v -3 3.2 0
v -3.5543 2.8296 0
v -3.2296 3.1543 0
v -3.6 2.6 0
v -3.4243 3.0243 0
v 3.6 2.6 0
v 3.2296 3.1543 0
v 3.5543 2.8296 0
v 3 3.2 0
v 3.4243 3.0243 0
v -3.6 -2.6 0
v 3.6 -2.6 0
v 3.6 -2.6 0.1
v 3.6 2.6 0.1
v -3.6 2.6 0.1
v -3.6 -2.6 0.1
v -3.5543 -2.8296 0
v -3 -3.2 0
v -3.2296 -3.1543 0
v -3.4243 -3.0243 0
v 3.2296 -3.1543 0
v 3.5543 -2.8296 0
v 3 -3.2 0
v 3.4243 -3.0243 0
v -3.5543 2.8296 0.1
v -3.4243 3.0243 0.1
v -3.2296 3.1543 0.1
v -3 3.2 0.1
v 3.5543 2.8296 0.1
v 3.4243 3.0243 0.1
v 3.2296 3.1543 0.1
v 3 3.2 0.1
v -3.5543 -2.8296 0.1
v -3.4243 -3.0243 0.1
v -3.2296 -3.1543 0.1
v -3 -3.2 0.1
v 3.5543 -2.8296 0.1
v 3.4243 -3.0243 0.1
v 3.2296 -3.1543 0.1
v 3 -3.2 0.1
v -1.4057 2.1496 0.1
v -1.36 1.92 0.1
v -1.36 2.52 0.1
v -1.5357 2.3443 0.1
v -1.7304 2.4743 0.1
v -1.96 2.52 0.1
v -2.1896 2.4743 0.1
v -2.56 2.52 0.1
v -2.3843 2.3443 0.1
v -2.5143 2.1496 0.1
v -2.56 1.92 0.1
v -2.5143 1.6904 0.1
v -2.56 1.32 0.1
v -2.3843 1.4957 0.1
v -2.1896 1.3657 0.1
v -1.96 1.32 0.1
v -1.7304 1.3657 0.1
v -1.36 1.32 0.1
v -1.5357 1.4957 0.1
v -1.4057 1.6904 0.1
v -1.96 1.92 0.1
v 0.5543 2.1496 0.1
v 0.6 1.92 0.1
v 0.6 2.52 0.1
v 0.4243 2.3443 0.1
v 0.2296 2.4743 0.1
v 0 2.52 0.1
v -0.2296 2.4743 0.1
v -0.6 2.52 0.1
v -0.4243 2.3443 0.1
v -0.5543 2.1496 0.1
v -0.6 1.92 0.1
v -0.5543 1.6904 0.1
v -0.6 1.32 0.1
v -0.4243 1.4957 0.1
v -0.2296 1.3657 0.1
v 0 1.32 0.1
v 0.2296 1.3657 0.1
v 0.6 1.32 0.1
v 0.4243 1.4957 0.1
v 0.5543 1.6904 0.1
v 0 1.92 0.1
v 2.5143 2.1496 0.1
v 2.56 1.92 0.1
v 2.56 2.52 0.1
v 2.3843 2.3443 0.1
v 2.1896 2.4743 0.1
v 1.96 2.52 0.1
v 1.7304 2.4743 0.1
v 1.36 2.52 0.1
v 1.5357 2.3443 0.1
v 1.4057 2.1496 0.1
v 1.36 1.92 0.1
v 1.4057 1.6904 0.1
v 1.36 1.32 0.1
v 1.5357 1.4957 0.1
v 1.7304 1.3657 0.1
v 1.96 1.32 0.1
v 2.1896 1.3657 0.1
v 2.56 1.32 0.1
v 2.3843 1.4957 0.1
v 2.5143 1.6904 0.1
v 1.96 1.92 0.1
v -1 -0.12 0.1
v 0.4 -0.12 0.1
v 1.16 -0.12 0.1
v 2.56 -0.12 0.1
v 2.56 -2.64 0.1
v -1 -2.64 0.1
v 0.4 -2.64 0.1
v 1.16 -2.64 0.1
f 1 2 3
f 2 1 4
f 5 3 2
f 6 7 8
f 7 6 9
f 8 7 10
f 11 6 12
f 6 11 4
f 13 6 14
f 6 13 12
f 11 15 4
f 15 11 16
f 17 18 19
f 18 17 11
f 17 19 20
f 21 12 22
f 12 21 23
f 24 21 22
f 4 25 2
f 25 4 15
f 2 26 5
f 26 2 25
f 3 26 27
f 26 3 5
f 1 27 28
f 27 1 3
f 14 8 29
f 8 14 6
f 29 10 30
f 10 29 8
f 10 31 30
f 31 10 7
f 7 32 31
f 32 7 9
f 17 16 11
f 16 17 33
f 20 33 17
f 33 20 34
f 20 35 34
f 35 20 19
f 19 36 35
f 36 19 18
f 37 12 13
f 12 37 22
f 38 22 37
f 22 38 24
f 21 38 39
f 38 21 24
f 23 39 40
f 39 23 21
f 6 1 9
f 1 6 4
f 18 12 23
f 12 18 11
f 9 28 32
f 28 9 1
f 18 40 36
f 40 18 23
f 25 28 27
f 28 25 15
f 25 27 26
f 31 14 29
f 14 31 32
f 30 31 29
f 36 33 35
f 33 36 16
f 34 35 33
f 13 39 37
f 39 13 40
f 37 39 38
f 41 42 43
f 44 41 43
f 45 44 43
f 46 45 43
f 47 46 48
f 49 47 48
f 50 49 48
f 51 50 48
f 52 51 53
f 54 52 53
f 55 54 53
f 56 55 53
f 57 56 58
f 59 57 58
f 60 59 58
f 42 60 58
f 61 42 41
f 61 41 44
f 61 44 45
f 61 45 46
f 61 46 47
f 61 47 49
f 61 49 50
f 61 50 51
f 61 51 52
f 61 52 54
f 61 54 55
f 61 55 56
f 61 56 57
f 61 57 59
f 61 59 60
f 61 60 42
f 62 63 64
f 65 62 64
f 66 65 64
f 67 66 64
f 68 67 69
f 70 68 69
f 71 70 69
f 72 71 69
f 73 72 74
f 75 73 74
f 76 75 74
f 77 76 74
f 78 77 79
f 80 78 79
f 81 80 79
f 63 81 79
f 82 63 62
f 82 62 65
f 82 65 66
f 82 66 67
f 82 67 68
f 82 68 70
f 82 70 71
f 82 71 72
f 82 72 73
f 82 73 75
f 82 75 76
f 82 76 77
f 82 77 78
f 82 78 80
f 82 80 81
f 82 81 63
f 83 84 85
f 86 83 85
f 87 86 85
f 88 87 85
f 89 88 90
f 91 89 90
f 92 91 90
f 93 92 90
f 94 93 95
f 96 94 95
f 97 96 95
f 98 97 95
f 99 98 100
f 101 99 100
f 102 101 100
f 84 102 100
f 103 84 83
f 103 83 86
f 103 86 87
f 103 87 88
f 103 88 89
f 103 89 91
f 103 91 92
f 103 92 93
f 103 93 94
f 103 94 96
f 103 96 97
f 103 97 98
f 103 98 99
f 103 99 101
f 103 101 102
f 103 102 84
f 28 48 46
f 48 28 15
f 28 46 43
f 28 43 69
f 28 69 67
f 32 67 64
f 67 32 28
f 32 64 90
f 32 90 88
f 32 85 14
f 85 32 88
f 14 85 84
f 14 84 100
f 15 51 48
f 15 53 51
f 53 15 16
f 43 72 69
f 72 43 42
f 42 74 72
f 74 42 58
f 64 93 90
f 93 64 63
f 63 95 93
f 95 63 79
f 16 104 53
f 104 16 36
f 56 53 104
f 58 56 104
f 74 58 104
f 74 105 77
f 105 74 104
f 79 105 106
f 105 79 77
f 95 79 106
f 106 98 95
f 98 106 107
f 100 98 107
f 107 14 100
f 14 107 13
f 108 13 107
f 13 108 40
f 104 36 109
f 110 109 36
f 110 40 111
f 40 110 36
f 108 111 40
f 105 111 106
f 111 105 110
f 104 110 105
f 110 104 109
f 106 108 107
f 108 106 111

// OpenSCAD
// file: ../p/box3u12.scad
use <../lib.scad>
function ldraw_lib__box3u12() = [
// 0 Box with 3 Parallel Faces without Any Edges
// 0 Name: box3u12.dat
// 0 Author: J.C. Tchang [tchang]
// 0 !LDRAW_ORG Primitive UPDATE 2014-02
// 0 !LICENSE Licensed under CC BY 4.0 : see CAreadme.txt
// 
// 0 BFC CERTIFY CCW
  [0,"BFC","CERTIFY"],
  [0,"BFC","CCW"],
// 
// 0 !HISTORY 2014-12-23 [PTadmin] Official Update 2014-02
// 
// 
// 4 16 -1 1 1 1 1 1 1 1 -1 -1 1 -1
  [4,16,-1,1,1,1,1,1,1,1,-1,-1,1,-1],
// 4 16 -1 1 1 -1 0 1 1 0 1 1 1 1
  [4,16,-1,1,1,-1,0,1,1,0,1,1,1,1],
// 4 16 1 1 -1 1 0 -1 -1 0 -1 -1 1 -1
  [4,16,1,1,-1,1,0,-1,-1,0,-1,-1,1,-1],
];
module ldraw_lib__box3u12(step=0, col=false, unit=2/5, alt=false, line=0.2, solid=!$preview)
    makepoly(ldraw_lib__box3u12(), step=step, col=col, unit=unit, alt=alt, line=line, solid=solid);
ldraw_lib__box3u12(line=0.2);
// file: ../p/1-4cyli.scad
use <../lib.scad>
function ldraw_lib__1_4cyli() = [
// 0 Cylinder 0.25
// 0 Name: 1-4cyli.dat
// 0 Author: James Jessiman
// 0 !LDRAW_ORG Primitive UPDATE 2012-01
// 0 !LICENSE Licensed under CC BY 4.0 : see CAreadme.txt
// 
// 0 BFC CERTIFY CCW
  [0,"BFC","CERTIFY"],
  [0,"BFC","CCW"],
// 
// 0 !HISTORY 2002-03-23 [sbliss] Added BFC statement.
// 0 !HISTORY 2002-04-25 [PTadmin] Official Update 2002-02
// 0 !HISTORY 2007-06-22 [PTadmin] Header formatted for Contributor Agreement
// 0 !HISTORY 2008-07-01 [PTadmin] Official Update 2008-01
// 0 !HISTORY 2012-02-16 [Philo] Changed to CCW
// 0 !HISTORY 2012-03-30 [PTadmin] Official Update 2012-01
// 
// 
// 4 16 1 1 0 0.9239 1 0.3827 0.9239 0 0.3827 1 0 0
  [4,16,1,1,0,0.9239,1,0.3827,0.9239,0,0.3827,1,0,0],
// 5 24 1 0 0 1 1 0 0.9239 0 0.3827 1 0 -1
  [5,24,1,0,0,1,1,0,0.9239,0,0.3827,1,0,-1],
// 4 16 0.9239 1 0.3827 0.7071 1 0.7071 0.7071 0 0.7071 0.9239 0 0.3827
  [4,16,0.9239,1,0.3827,0.7071,1,0.7071,0.7071,0,0.7071,0.9239,0,0.3827],
// 5 24 0.9239 0 0.3827 0.9239 1 0.3827 0.7071 0 0.7071 1 0 0
  [5,24,0.9239,0,0.3827,0.9239,1,0.3827,0.7071,0,0.7071,1,0,0],
// 4 16 0.7071 1 0.7071 0.3827 1 0.9239 0.3827 0 0.9239 0.7071 0 0.7071
  [4,16,0.7071,1,0.7071,0.3827,1,0.9239,0.3827,0,0.9239,0.7071,0,0.7071],
// 5 24 0.7071 0 0.7071 0.7071 1 0.7071 0.3827 0 0.9239 0.9239 0 0.3827
  [5,24,0.7071,0,0.7071,0.7071,1,0.7071,0.3827,0,0.9239,0.9239,0,0.3827],
// 4 16 0.3827 1 0.9239 0 1 1 0 0 1 0.3827 0 0.9239
  [4,16,0.3827,1,0.9239,0,1,1,0,0,1,0.3827,0,0.9239],
// 5 24 0.3827 0 0.9239 0.3827 1 0.9239 0 0 1 0.7071 0 0.7071
  [5,24,0.3827,0,0.9239,0.3827,1,0.9239,0,0,1,0.7071,0,0.7071],
// 5 24 0 0 1 0 1 1 0.3827 0 0.9239 -1 0 1
  [5,24,0,0,1,0,1,1,0.3827,0,0.9239,-1,0,1],
];
module ldraw_lib__1_4cyli(step=0, col=false, unit=2/5, alt=false, line=0.2, solid=!$preview)
    makepoly(ldraw_lib__1_4cyli(), step=step, col=col, unit=unit, alt=alt, line=line, solid=solid);
ldraw_lib__1_4cyli(line=0.2);
// file: s/stickerback008x009.scad
use <../../lib.scad>
use <../../p/1-4chrd.scad>
use <../../p/1-4cyli.scad>
use <../../p/box3u12.scad>
function ldraw_lib__s__stickerback008x009() = [
// 0 ~Sticker Back  0.8 x  0.9
// 0 Name: s\stickerback008x009.dat
// 0 Author: Massimo Maso [Sirio]
// 0 !LDRAW_ORG Subpart UPDATE 2026-05
// 0 !LICENSE Licensed under CC BY 4.0 : see CAreadme.txt
// 
// 0 BFC CERTIFY CCW
  [0,"BFC","CERTIFY"],
  [0,"BFC","CCW"],
// 
// 0 !HISTORY 2025-08-31 [OrionP] Official Update 2025-08
// 0 !HISTORY 2026-04-18 [MagFors] corrected length
// 0 !HISTORY 2026-05-31 [OrionP] Official Update 2026-05
// 
// 0 // Primitives
// 1 16 -7.5 0 6.5 -1.5 0 0 0 -1 0 0 0 1.5 1-4chrd.dat
  [1,16,-7.5,0,6.5,-1.5,0,0,0,-1,0,0,0,1.5, ldraw_lib__1_4chrd()],
// 1 16 7.5 0 6.5 1.5 0 0 0 -1 0 0 0 1.5 1-4chrd.dat
  [1,16,7.5,0,6.5,1.5,0,0,0,-1,0,0,0,1.5, ldraw_lib__1_4chrd()],
// 1 16 0 -.25 0 0 0 9 0 .25 0 6.5 0 0 box3u12.dat
  [1,16,0,-.25,0,0,0,9,0,.25,0,6.5,0,0, ldraw_lib__box3u12()],
// 1 16 -7.5 0 -6.5 -1.5 0 0 0 -1 0 0 0 -1.5 1-4chrd.dat
  [1,16,-7.5,0,-6.5,-1.5,0,0,0,-1,0,0,0,-1.5, ldraw_lib__1_4chrd()],
// 1 16 7.5 0 -6.5 1.5 0 0 0 -1 0 0 0 -1.5 1-4chrd.dat
  [1,16,7.5,0,-6.5,1.5,0,0,0,-1,0,0,0,-1.5, ldraw_lib__1_4chrd()],
// 1 16 -7.5 0 6.5 -1.5 0 0 0 -.25 0 0 0 1.5 1-4cyli.dat
  [1,16,-7.5,0,6.5,-1.5,0,0,0,-.25,0,0,0,1.5, ldraw_lib__1_4cyli()],
// 1 16 7.5 0 6.5 1.5 0 0 0 -.25 0 0 0 1.5 1-4cyli.dat
  [1,16,7.5,0,6.5,1.5,0,0,0,-.25,0,0,0,1.5, ldraw_lib__1_4cyli()],
// 1 16 -7.5 0 -6.5 -1.5 0 0 0 -.25 0 0 0 -1.5 1-4cyli.dat
  [1,16,-7.5,0,-6.5,-1.5,0,0,0,-.25,0,0,0,-1.5, ldraw_lib__1_4cyli()],
// 1 16 7.5 0 -6.5 1.5 0 0 0 -.25 0 0 0 -1.5 1-4cyli.dat
  [1,16,7.5,0,-6.5,1.5,0,0,0,-.25,0,0,0,-1.5, ldraw_lib__1_4cyli()],
// 0 // Bottom face
// 4 16 -7.5 0 8 7.5 0 8 9 0 6.5 -9 0 6.5
  [4,16,-7.5,0,8,7.5,0,8,9,0,6.5,-9,0,6.5],
// 4 16 -7.5 0 -8 -9 0 -6.5 9 0 -6.5 7.5 0 -8
  [4,16,-7.5,0,-8,-9,0,-6.5,9,0,-6.5,7.5,0,-8],
// 0 // Lateral face
// 4 16 -7.5 0 8 -7.5 -.25 8 7.5 -.25 8 7.5 0 8
  [4,16,-7.5,0,8,-7.5,-.25,8,7.5,-.25,8,7.5,0,8],
// 4 16 -7.5 0 -8 7.5 0 -8 7.5 -.25 -8 -7.5 -.25 -8
  [4,16,-7.5,0,-8,7.5,0,-8,7.5,-.25,-8,-7.5,-.25,-8],
];
module ldraw_lib__s__stickerback008x009(step=0, col=false, unit=2/5, alt=false, line=0.2, solid=!$preview)
    makepoly(ldraw_lib__s__stickerback008x009(), step=step, col=col, unit=unit, alt=alt, line=line, solid=solid);
ldraw_lib__s__stickerback008x009(line=0.2);
// file: ../p/4-4ndis.scad
use <../lib.scad>
function ldraw_lib__4_4ndis() = [
// 0 Disc Negative 1.0
// 0 Name: 4-4ndis.dat
// 0 Author: James Jessiman
// 0 !LDRAW_ORG Primitive UPDATE 2012-01
// 0 !LICENSE Licensed under CC BY 4.0 : see CAreadme.txt
// 
// 0 BFC CERTIFY CCW
  [0,"BFC","CERTIFY"],
  [0,"BFC","CCW"],
// 
// 0 !HISTORY 2002-03-23 [sbliss] Added BFC statement; compacted code
// 0 !HISTORY 2002-04-25 [PTadmin] Official Update 2002-02
// 0 !HISTORY 2007-06-24 [PTadmin] Header formatted for Contributor Agreement
// 0 !HISTORY 2008-07-01 [PTadmin] Official Update 2008-01
// 0 !HISTORY 2012-02-16 [Philo] Changed to CCW
// 0 !HISTORY 2012-03-30 [PTadmin] Official Update 2012-01
// 
// 
// 3 16 0.9239 0 0.3827 1 0 0 1 0 1
  [3,16,0.9239,0,0.3827,1,0,0,1,0,1],
// 3 16 0.7071 0 0.7071 0.9239 0 0.3827 1 0 1
  [3,16,0.7071,0,0.7071,0.9239,0,0.3827,1,0,1],
// 3 16 0.3827 0 0.9239 0.7071 0 0.7071 1 0 1
  [3,16,0.3827,0,0.9239,0.7071,0,0.7071,1,0,1],
// 3 16 0 0 1 0.3827 0 0.9239 1 0 1
  [3,16,0,0,1,0.3827,0,0.9239,1,0,1],
// 3 16 -0.3827 0 0.9239 0 0 1 -1 0 1
  [3,16,-0.3827,0,0.9239,0,0,1,-1,0,1],
// 3 16 -0.7071 0 0.7071 -0.3827 0 0.9239 -1 0 1
  [3,16,-0.7071,0,0.7071,-0.3827,0,0.9239,-1,0,1],
// 3 16 -0.9239 0 0.3827 -0.7071 0 0.7071 -1 0 1
  [3,16,-0.9239,0,0.3827,-0.7071,0,0.7071,-1,0,1],
// 3 16 -1 0 0 -0.9239 0 0.3827 -1 0 1
  [3,16,-1,0,0,-0.9239,0,0.3827,-1,0,1],
// 3 16 -0.9239 0 -0.3827 -1 0 0 -1 0 -1
  [3,16,-0.9239,0,-0.3827,-1,0,0,-1,0,-1],
// 3 16 -0.7071 0 -0.7071 -0.9239 0 -0.3827 -1 0 -1
  [3,16,-0.7071,0,-0.7071,-0.9239,0,-0.3827,-1,0,-1],
// 3 16 -0.3827 0 -0.9239 -0.7071 0 -0.7071 -1 0 -1
  [3,16,-0.3827,0,-0.9239,-0.7071,0,-0.7071,-1,0,-1],
// 3 16 0 0 -1 -0.3827 0 -0.9239 -1 0 -1
  [3,16,0,0,-1,-0.3827,0,-0.9239,-1,0,-1],
// 3 16 0.3827 0 -0.9239 0 0 -1 1 0 -1
  [3,16,0.3827,0,-0.9239,0,0,-1,1,0,-1],
// 3 16 0.7071 0 -0.7071 0.3827 0 -0.9239 1 0 -1
  [3,16,0.7071,0,-0.7071,0.3827,0,-0.9239,1,0,-1],
// 3 16 0.9239 0 -0.3827 0.7071 0 -0.7071 1 0 -1
  [3,16,0.9239,0,-0.3827,0.7071,0,-0.7071,1,0,-1],
// 3 16 1 0 0 0.9239 0 -0.3827 1 0 -1
  [3,16,1,0,0,0.9239,0,-0.3827,1,0,-1],
];
module ldraw_lib__4_4ndis(step=0, col=false, unit=2/5, alt=false, line=0.2, solid=!$preview)
    makepoly(ldraw_lib__4_4ndis(), step=step, col=col, unit=unit, alt=alt, line=line, solid=solid);
ldraw_lib__4_4ndis(line=0.2);
// file: ../p/4-4disc.scad
use <../lib.scad>
function ldraw_lib__4_4disc() = [
// 0 Disc 1.0
// 0 Name: 4-4disc.dat
// 0 Author: James Jessiman
// 0 !LDRAW_ORG Primitive UPDATE 2002-02
// 0 !LICENSE Licensed under CC BY 4.0 : see CAreadme.txt
// 
// 0 BFC CERTIFY CCW
  [0,"BFC","CERTIFY"],
  [0,"BFC","CCW"],
// 
// 0 !HISTORY 1998-12-15 [PTadmin] Official Update 1998-10
// 0 !HISTORY 2002-03-23 [sbliss] Added BFC statement
// 0 !HISTORY 2002-04-25 [PTadmin] Official Update 2002-02
// 0 !HISTORY 2007-06-24 [PTadmin] Header formatted for Contributor Agreement
// 0 !HISTORY 2008-07-01 [PTadmin] Official Update 2008-01
// 
// 
// 3 16 0 0 0 1 0 0 0.9239 0 0.3827
  [3,16,0,0,0,1,0,0,0.9239,0,0.3827],
// 3 16 0 0 0 0.9239 0 0.3827 0.7071 0 0.7071
  [3,16,0,0,0,0.9239,0,0.3827,0.7071,0,0.7071],
// 3 16 0 0 0 0.7071 0 0.7071 0.3827 0 0.9239
  [3,16,0,0,0,0.7071,0,0.7071,0.3827,0,0.9239],
// 3 16 0 0 0 0.3827 0 0.9239 0 0 1
  [3,16,0,0,0,0.3827,0,0.9239,0,0,1],
// 3 16 0 0 0 0 0 1 -0.3827 0 0.9239
  [3,16,0,0,0,0,0,1,-0.3827,0,0.9239],
// 3 16 0 0 0 -0.3827 0 0.9239 -0.7071 0 0.7071
  [3,16,0,0,0,-0.3827,0,0.9239,-0.7071,0,0.7071],
// 3 16 0 0 0 -0.7071 0 0.7071 -0.9239 0 0.3827
  [3,16,0,0,0,-0.7071,0,0.7071,-0.9239,0,0.3827],
// 3 16 0 0 0 -0.9239 0 0.3827 -1 0 -0
  [3,16,0,0,0,-0.9239,0,0.3827,-1,0,-0],
// 3 16 0 0 0 -1 0 -0 -0.9239 0 -0.3827
  [3,16,0,0,0,-1,0,-0,-0.9239,0,-0.3827],
// 3 16 0 0 0 -0.9239 0 -0.3827 -0.7071 0 -0.7071
  [3,16,0,0,0,-0.9239,0,-0.3827,-0.7071,0,-0.7071],
// 3 16 0 0 0 -0.7071 0 -0.7071 -0.3827 0 -0.9239
  [3,16,0,0,0,-0.7071,0,-0.7071,-0.3827,0,-0.9239],
// 3 16 0 0 0 -0.3827 0 -0.9239 0 0 -1
  [3,16,0,0,0,-0.3827,0,-0.9239,0,0,-1],
// 3 16 0 0 0 0 0 -1 0.3827 0 -0.9239
  [3,16,0,0,0,0,0,-1,0.3827,0,-0.9239],
// 3 16 0 0 0 0.3827 0 -0.9239 0.7071 0 -0.7071
  [3,16,0,0,0,0.3827,0,-0.9239,0.7071,0,-0.7071],
// 3 16 0 0 0 0.7071 0 -0.7071 0.9239 0 -0.3827
  [3,16,0,0,0,0.7071,0,-0.7071,0.9239,0,-0.3827],
// 3 16 0 0 0 0.9239 0 -0.3827 1 0 0
  [3,16,0,0,0,0.9239,0,-0.3827,1,0,0],
// 0
];
module ldraw_lib__4_4disc(step=0, col=false, unit=2/5, alt=false, line=0.2, solid=!$preview)
    makepoly(ldraw_lib__4_4disc(), step=step, col=col, unit=unit, alt=alt, line=line, solid=solid);
ldraw_lib__4_4disc(line=0.2);
// file: ../p/1-4chrd.scad
use <../lib.scad>
function ldraw_lib__1_4chrd() = [
// 0 Chord 0.25
// 0 Name: 1-4chrd.dat
// 0 Author: Max Martin Richter [MMR1988]
// 0 !LDRAW_ORG Primitive UPDATE 2023-05
// 0 !LICENSE Licensed under CC BY 4.0 : see CAreadme.txt
// 
// 0 BFC CERTIFY CCW
  [0,"BFC","CERTIFY"],
  [0,"BFC","CCW"],
// 
// 0 !HISTORY 2004-04-22 [PTadmin] Official Update 2004-02
// 0 !HISTORY 2007-10-09 [PTadmin] Header formatted for Contributor Agreement
// 0 !HISTORY 2008-07-01 [PTadmin] Official Update 2008-01
// 0 !HISTORY 2012-08-02 [MMR1988] Re-creation with PrimGen2 and Rectifier
// 0 !HISTORY 2012-08-09 [PTadmin] Official Update 2012-02
// 0 !HISTORY 2023-10-27 [OrionP] Change author to MMR1988 from hafhead
// 0 !HISTORY 2023-10-31 [OrionP] Official Update 2023-05
// 
// 4 16 0.9239 0 0.3827 0.3827 0 0.9239 0 0 1 1 0 0
  [4,16,0.9239,0,0.3827,0.3827,0,0.9239,0,0,1,1,0,0],
// 3 16 0.7071 0 0.7071 0.3827 0 0.9239 0.9239 0 0.3827
  [3,16,0.7071,0,0.7071,0.3827,0,0.9239,0.9239,0,0.3827],
];
module ldraw_lib__1_4chrd(step=0, col=false, unit=2/5, alt=false, line=0.2, solid=!$preview)
    makepoly(ldraw_lib__1_4chrd(), step=step, col=col, unit=unit, alt=alt, line=line, solid=solid);
ldraw_lib__1_4chrd(line=0.2);
// main file
use <../lib.scad>
use <../p/1-4chrd.scad>
use <../p/4-4disc.scad>
use <../p/4-4ndis.scad>
use <s/stickerback008x009.scad>
function ldraw_lib__4510086b() = [
// 0 Sticker  0.8 x  0.9 with Red and Blue Buttons
// 0 Name: 4510086b.dat
// 0 Author: Evert-Jan Boer [ejboer]
// 0 !LDRAW_ORG Part UPDATE 2026-08
// 0 !LICENSE Licensed under CC BY 4.0 : see CAreadme.txt
// 
// 0 BFC CERTIFY CCW
  [0,"BFC","CERTIFY"],
  [0,"BFC","CCW"],
// 
// 0 !CATEGORY Sticker
// 0 !KEYWORDS Bricklink 10179stk01, Brickowl 677332, Millennium Falcon
// 0 !KEYWORDS Rebrickable 60285, Set 10179, Star Wars
// 
// 0 !HISTORY 2024-06-30 [OrionP] Official Update 2024-05
// 0 !HISTORY 2026-04-17 [Sirio] Introduced stickerback, changed description, and adapted top face
// 0 !HISTORY 2026-08-27 [MagFors] Update description
// 0 !HISTORY 2026-08-31 [OrionP] Official Update 2026-08
// 
// 0 // Stickerback
// 1 16 0 0 0 1 0 0 0 1 0 0 0 1 s\stickerback008x009.dat
  [1,16,0,0,0,1,0,0,0,1,0,0,0,1, ldraw_lib__s__stickerback008x009()],
// 0 // Primitives
// 1 0 -7.5 -.25 6.5 -1.5 0 0 0 1 0 0 0 1.5 1-4chrd.dat
  [1,0,-7.5,-.25,6.5,-1.5,0,0,0,1,0,0,0,1.5, ldraw_lib__1_4chrd()],
// 1 0 7.5 -.25 6.5 1.5 0 0 0 1 0 0 0 1.5 1-4chrd.dat
  [1,0,7.5,-.25,6.5,1.5,0,0,0,1,0,0,0,1.5, ldraw_lib__1_4chrd()],
// 1 0 -7.5 -.25 -6.5 -1.5 0 0 0 1 0 0 0 -1.5 1-4chrd.dat
  [1,0,-7.5,-.25,-6.5,-1.5,0,0,0,1,0,0,0,-1.5, ldraw_lib__1_4chrd()],
// 1 0 7.5 -.25 -6.5 1.5 0 0 0 1 0 0 0 -1.5 1-4chrd.dat
  [1,0,7.5,-.25,-6.5,1.5,0,0,0,1,0,0,0,-1.5, ldraw_lib__1_4chrd()],
// 1 0 -4.9 -.25 4.8 1.5 0 0 0 1 0 0 0 1.5 4-4ndis.dat
  [1,0,-4.9,-.25,4.8,1.5,0,0,0,1,0,0,0,1.5, ldraw_lib__4_4ndis()],
// 1 4 -4.9 -.25 4.8 1.5 0 0 0 1 0 0 0 1.5 4-4disc.dat
  [1,4,-4.9,-.25,4.8,1.5,0,0,0,1,0,0,0,1.5, ldraw_lib__4_4disc()],
// 1 0 0 -.25 4.8 1.5 0 0 0 1 0 0 0 1.5 4-4ndis.dat
  [1,0,0,-.25,4.8,1.5,0,0,0,1,0,0,0,1.5, ldraw_lib__4_4ndis()],
// 1 4 0 -.25 4.8 1.5 0 0 0 1 0 0 0 1.5 4-4disc.dat
  [1,4,0,-.25,4.8,1.5,0,0,0,1,0,0,0,1.5, ldraw_lib__4_4disc()],
// 1 0 4.9 -.25 4.8 1.5 0 0 0 1 0 0 0 1.5 4-4ndis.dat
  [1,0,4.9,-.25,4.8,1.5,0,0,0,1,0,0,0,1.5, ldraw_lib__4_4ndis()],
// 1 4 4.9 -.25 4.8 1.5 0 0 0 1 0 0 0 1.5 4-4disc.dat
  [1,4,4.9,-.25,4.8,1.5,0,0,0,1,0,0,0,1.5, ldraw_lib__4_4disc()],
// 0 // Top face
// 0 // Black faces
// 4 0 -9 -.25 6.5 -6.4 -.25 6.3 -4.9 -.25 6.3 -7.5 -.25 8
  [4,0,-9,-.25,6.5,-6.4,-.25,6.3,-4.9,-.25,6.3,-7.5,-.25,8],
// 3 0 -7.5 -.25 8 -4.9 -.25 6.3 -3.4 -.25 6.3
  [3,0,-7.5,-.25,8,-4.9,-.25,6.3,-3.4,-.25,6.3],
// 3 0 -7.5 -.25 8 -3.4 -.25 6.3 -1.5 -.25 6.3
  [3,0,-7.5,-.25,8,-3.4,-.25,6.3,-1.5,-.25,6.3],
// 3 0 -7.5 -.25 8 -1.5 -.25 6.3 0 -.25 6.3
  [3,0,-7.5,-.25,8,-1.5,-.25,6.3,0,-.25,6.3],
// 4 0 0 -.25 6.3 1.5 -.25 6.3 7.5 -.25 8 -7.5 -.25 8
  [4,0,0,-.25,6.3,1.5,-.25,6.3,7.5,-.25,8,-7.5,-.25,8],
// 3 0 7.5 -.25 8 1.5 -.25 6.3 3.4 -.25 6.3
  [3,0,7.5,-.25,8,1.5,-.25,6.3,3.4,-.25,6.3],
// 3 0 7.5 -.25 8 3.4 -.25 6.3 4.9 -.25 6.3
  [3,0,7.5,-.25,8,3.4,-.25,6.3,4.9,-.25,6.3],
// 4 0 4.9 -.25 6.3 6.4 -.25 6.3 9 -.25 6.5 7.5 -.25 8
  [4,0,4.9,-.25,6.3,6.4,-.25,6.3,9,-.25,6.5,7.5,-.25,8],
// 3 0 9 -.25 6.5 6.4 -.25 6.3 6.4 -.25 4.8
  [3,0,9,-.25,6.5,6.4,-.25,6.3,6.4,-.25,4.8],
// 3 0 9 -.25 6.5 6.4 -.25 4.8 6.4 -.25 3.3
  [3,0,9,-.25,6.5,6.4,-.25,4.8,6.4,-.25,3.3],
// 3 0 -9 -.25 6.5 -6.4 -.25 4.8 -6.4 -.25 6.3
  [3,0,-9,-.25,6.5,-6.4,-.25,4.8,-6.4,-.25,6.3],
// 4 0 -9 -.25 -6.5 -6.4 -.25 3.3 -6.4 -.25 4.8 -9 -.25 6.5
  [4,0,-9,-.25,-6.5,-6.4,-.25,3.3,-6.4,-.25,4.8,-9,-.25,6.5],
// 4 0 -3.4 -.25 6.3 -3.4 -.25 4.8 -1.5 -.25 4.8 -1.5 -.25 6.3
  [4,0,-3.4,-.25,6.3,-3.4,-.25,4.8,-1.5,-.25,4.8,-1.5,-.25,6.3],
// 4 0 -3.4 -.25 4.8 -3.4 -.25 3.3 -1.5 -.25 3.3 -1.5 -.25 4.8
  [4,0,-3.4,-.25,4.8,-3.4,-.25,3.3,-1.5,-.25,3.3,-1.5,-.25,4.8],
// 4 0 1.5 -.25 6.3 1.5 -.25 4.8 3.4 -.25 4.8 3.4 -.25 6.3
  [4,0,1.5,-.25,6.3,1.5,-.25,4.8,3.4,-.25,4.8,3.4,-.25,6.3],
// 4 0 1.5 -.25 4.8 1.5 -.25 3.3 3.4 -.25 3.3 3.4 -.25 4.8
  [4,0,1.5,-.25,4.8,1.5,-.25,3.3,3.4,-.25,3.3,3.4,-.25,4.8],
// 4 0 -9 -.25 -6.5 -7.5 -.25 -8 -2.5 -.25 -.3 -6.4 -.25 3.3
  [4,0,-9,-.25,-6.5,-7.5,-.25,-8,-2.5,-.25,-.3,-6.4,-.25,3.3],
// 3 0 -4.9 -.25 3.3 -6.4 -.25 3.3 -2.5 -.25 -.3
  [3,0,-4.9,-.25,3.3,-6.4,-.25,3.3,-2.5,-.25,-.3],
// 3 0 -3.4 -.25 3.3 -4.9 -.25 3.3 -2.5 -.25 -.3
  [3,0,-3.4,-.25,3.3,-4.9,-.25,3.3,-2.5,-.25,-.3],
// 3 0 -1.5 -.25 3.3 -3.4 -.25 3.3 -2.5 -.25 -.3
  [3,0,-1.5,-.25,3.3,-3.4,-.25,3.3,-2.5,-.25,-.3],
// 4 0 -1.5 -.25 3.3 -2.5 -.25 -.3 1 -.25 -.3 0 -.25 3.3
  [4,0,-1.5,-.25,3.3,-2.5,-.25,-.3,1,-.25,-.3,0,-.25,3.3],
// 4 0 0 -.25 3.3 1 -.25 -.3 2.9 -.25 -.3 1.5 -.25 3.3
  [4,0,0,-.25,3.3,1,-.25,-.3,2.9,-.25,-.3,1.5,-.25,3.3],
// 3 0 3.4 -.25 3.3 1.5 -.25 3.3 2.9 -.25 -.3
  [3,0,3.4,-.25,3.3,1.5,-.25,3.3,2.9,-.25,-.3],
// 4 0 3.4 -.25 3.3 2.9 -.25 -.3 6.4 -.25 -.3 4.9 -.25 3.3
  [4,0,3.4,-.25,3.3,2.9,-.25,-.3,6.4,-.25,-.3,4.9,-.25,3.3],
// 3 0 6.4 -.25 3.3 4.9 -.25 3.3 6.4 -.25 -.3
  [3,0,6.4,-.25,3.3,4.9,-.25,3.3,6.4,-.25,-.3],
// 4 0 6.4 -.25 3.3 6.4 -.25 -.3 9 -.25 -6.5 9 -.25 6.5
  [4,0,6.4,-.25,3.3,6.4,-.25,-.3,9,-.25,-6.5,9,-.25,6.5],
// 4 0 9 -.25 -6.5 6.4 -.25 -.3 6.4 -.25 -6.6 7.5 -.25 -8
  [4,0,9,-.25,-6.5,6.4,-.25,-.3,6.4,-.25,-6.6,7.5,-.25,-8],
// 3 0 -2.5 -.25 -.3 -7.5 -.25 -8 -2.5 -.25 -6.6
  [3,0,-2.5,-.25,-.3,-7.5,-.25,-8,-2.5,-.25,-6.6],
// 3 0 1 -.25 -6.6 -2.5 -.25 -6.6 -7.5 -.25 -8
  [3,0,1,-.25,-6.6,-2.5,-.25,-6.6,-7.5,-.25,-8],
// 4 0 1 -.25 -6.6 -7.5 -.25 -8 7.5 -.25 -8 2.9 -.25 -6.6
  [4,0,1,-.25,-6.6,-7.5,-.25,-8,7.5,-.25,-8,2.9,-.25,-6.6],
// 3 0 6.4 -.25 -6.6 2.9 -.25 -6.6 7.5 -.25 -8
  [3,0,6.4,-.25,-6.6,2.9,-.25,-6.6,7.5,-.25,-8],
// 4 0 1 -.25 -.3 1 -.25 -6.6 2.9 -.25 -6.6 2.9 -.25 -.3
  [4,0,1,-.25,-.3,1,-.25,-6.6,2.9,-.25,-6.6,2.9,-.25,-.3],
// 0 // Blue faces
// 4 1 -2.5 -.25 -.3 -2.5 -.25 -6.6 1 -.25 -6.6 1 -.25 -.3
  [4,1,-2.5,-.25,-.3,-2.5,-.25,-6.6,1,-.25,-6.6,1,-.25,-.3],
// 4 1 2.9 -.25 -.3 2.9 -.25 -6.6 6.4 -.25 -6.6 6.4 -.25 -.3
  [4,1,2.9,-.25,-.3,2.9,-.25,-6.6,6.4,-.25,-6.6,6.4,-.25,-.3],
];
module ldraw_lib__4510086b(step=0, col=false, unit=2/5, alt=false, line=0.2, solid=!$preview)
    makepoly(ldraw_lib__4510086b(), step=step, col=col, unit=unit, alt=alt, line=line, solid=solid);
ldraw_lib__4510086b(line=0.2);
